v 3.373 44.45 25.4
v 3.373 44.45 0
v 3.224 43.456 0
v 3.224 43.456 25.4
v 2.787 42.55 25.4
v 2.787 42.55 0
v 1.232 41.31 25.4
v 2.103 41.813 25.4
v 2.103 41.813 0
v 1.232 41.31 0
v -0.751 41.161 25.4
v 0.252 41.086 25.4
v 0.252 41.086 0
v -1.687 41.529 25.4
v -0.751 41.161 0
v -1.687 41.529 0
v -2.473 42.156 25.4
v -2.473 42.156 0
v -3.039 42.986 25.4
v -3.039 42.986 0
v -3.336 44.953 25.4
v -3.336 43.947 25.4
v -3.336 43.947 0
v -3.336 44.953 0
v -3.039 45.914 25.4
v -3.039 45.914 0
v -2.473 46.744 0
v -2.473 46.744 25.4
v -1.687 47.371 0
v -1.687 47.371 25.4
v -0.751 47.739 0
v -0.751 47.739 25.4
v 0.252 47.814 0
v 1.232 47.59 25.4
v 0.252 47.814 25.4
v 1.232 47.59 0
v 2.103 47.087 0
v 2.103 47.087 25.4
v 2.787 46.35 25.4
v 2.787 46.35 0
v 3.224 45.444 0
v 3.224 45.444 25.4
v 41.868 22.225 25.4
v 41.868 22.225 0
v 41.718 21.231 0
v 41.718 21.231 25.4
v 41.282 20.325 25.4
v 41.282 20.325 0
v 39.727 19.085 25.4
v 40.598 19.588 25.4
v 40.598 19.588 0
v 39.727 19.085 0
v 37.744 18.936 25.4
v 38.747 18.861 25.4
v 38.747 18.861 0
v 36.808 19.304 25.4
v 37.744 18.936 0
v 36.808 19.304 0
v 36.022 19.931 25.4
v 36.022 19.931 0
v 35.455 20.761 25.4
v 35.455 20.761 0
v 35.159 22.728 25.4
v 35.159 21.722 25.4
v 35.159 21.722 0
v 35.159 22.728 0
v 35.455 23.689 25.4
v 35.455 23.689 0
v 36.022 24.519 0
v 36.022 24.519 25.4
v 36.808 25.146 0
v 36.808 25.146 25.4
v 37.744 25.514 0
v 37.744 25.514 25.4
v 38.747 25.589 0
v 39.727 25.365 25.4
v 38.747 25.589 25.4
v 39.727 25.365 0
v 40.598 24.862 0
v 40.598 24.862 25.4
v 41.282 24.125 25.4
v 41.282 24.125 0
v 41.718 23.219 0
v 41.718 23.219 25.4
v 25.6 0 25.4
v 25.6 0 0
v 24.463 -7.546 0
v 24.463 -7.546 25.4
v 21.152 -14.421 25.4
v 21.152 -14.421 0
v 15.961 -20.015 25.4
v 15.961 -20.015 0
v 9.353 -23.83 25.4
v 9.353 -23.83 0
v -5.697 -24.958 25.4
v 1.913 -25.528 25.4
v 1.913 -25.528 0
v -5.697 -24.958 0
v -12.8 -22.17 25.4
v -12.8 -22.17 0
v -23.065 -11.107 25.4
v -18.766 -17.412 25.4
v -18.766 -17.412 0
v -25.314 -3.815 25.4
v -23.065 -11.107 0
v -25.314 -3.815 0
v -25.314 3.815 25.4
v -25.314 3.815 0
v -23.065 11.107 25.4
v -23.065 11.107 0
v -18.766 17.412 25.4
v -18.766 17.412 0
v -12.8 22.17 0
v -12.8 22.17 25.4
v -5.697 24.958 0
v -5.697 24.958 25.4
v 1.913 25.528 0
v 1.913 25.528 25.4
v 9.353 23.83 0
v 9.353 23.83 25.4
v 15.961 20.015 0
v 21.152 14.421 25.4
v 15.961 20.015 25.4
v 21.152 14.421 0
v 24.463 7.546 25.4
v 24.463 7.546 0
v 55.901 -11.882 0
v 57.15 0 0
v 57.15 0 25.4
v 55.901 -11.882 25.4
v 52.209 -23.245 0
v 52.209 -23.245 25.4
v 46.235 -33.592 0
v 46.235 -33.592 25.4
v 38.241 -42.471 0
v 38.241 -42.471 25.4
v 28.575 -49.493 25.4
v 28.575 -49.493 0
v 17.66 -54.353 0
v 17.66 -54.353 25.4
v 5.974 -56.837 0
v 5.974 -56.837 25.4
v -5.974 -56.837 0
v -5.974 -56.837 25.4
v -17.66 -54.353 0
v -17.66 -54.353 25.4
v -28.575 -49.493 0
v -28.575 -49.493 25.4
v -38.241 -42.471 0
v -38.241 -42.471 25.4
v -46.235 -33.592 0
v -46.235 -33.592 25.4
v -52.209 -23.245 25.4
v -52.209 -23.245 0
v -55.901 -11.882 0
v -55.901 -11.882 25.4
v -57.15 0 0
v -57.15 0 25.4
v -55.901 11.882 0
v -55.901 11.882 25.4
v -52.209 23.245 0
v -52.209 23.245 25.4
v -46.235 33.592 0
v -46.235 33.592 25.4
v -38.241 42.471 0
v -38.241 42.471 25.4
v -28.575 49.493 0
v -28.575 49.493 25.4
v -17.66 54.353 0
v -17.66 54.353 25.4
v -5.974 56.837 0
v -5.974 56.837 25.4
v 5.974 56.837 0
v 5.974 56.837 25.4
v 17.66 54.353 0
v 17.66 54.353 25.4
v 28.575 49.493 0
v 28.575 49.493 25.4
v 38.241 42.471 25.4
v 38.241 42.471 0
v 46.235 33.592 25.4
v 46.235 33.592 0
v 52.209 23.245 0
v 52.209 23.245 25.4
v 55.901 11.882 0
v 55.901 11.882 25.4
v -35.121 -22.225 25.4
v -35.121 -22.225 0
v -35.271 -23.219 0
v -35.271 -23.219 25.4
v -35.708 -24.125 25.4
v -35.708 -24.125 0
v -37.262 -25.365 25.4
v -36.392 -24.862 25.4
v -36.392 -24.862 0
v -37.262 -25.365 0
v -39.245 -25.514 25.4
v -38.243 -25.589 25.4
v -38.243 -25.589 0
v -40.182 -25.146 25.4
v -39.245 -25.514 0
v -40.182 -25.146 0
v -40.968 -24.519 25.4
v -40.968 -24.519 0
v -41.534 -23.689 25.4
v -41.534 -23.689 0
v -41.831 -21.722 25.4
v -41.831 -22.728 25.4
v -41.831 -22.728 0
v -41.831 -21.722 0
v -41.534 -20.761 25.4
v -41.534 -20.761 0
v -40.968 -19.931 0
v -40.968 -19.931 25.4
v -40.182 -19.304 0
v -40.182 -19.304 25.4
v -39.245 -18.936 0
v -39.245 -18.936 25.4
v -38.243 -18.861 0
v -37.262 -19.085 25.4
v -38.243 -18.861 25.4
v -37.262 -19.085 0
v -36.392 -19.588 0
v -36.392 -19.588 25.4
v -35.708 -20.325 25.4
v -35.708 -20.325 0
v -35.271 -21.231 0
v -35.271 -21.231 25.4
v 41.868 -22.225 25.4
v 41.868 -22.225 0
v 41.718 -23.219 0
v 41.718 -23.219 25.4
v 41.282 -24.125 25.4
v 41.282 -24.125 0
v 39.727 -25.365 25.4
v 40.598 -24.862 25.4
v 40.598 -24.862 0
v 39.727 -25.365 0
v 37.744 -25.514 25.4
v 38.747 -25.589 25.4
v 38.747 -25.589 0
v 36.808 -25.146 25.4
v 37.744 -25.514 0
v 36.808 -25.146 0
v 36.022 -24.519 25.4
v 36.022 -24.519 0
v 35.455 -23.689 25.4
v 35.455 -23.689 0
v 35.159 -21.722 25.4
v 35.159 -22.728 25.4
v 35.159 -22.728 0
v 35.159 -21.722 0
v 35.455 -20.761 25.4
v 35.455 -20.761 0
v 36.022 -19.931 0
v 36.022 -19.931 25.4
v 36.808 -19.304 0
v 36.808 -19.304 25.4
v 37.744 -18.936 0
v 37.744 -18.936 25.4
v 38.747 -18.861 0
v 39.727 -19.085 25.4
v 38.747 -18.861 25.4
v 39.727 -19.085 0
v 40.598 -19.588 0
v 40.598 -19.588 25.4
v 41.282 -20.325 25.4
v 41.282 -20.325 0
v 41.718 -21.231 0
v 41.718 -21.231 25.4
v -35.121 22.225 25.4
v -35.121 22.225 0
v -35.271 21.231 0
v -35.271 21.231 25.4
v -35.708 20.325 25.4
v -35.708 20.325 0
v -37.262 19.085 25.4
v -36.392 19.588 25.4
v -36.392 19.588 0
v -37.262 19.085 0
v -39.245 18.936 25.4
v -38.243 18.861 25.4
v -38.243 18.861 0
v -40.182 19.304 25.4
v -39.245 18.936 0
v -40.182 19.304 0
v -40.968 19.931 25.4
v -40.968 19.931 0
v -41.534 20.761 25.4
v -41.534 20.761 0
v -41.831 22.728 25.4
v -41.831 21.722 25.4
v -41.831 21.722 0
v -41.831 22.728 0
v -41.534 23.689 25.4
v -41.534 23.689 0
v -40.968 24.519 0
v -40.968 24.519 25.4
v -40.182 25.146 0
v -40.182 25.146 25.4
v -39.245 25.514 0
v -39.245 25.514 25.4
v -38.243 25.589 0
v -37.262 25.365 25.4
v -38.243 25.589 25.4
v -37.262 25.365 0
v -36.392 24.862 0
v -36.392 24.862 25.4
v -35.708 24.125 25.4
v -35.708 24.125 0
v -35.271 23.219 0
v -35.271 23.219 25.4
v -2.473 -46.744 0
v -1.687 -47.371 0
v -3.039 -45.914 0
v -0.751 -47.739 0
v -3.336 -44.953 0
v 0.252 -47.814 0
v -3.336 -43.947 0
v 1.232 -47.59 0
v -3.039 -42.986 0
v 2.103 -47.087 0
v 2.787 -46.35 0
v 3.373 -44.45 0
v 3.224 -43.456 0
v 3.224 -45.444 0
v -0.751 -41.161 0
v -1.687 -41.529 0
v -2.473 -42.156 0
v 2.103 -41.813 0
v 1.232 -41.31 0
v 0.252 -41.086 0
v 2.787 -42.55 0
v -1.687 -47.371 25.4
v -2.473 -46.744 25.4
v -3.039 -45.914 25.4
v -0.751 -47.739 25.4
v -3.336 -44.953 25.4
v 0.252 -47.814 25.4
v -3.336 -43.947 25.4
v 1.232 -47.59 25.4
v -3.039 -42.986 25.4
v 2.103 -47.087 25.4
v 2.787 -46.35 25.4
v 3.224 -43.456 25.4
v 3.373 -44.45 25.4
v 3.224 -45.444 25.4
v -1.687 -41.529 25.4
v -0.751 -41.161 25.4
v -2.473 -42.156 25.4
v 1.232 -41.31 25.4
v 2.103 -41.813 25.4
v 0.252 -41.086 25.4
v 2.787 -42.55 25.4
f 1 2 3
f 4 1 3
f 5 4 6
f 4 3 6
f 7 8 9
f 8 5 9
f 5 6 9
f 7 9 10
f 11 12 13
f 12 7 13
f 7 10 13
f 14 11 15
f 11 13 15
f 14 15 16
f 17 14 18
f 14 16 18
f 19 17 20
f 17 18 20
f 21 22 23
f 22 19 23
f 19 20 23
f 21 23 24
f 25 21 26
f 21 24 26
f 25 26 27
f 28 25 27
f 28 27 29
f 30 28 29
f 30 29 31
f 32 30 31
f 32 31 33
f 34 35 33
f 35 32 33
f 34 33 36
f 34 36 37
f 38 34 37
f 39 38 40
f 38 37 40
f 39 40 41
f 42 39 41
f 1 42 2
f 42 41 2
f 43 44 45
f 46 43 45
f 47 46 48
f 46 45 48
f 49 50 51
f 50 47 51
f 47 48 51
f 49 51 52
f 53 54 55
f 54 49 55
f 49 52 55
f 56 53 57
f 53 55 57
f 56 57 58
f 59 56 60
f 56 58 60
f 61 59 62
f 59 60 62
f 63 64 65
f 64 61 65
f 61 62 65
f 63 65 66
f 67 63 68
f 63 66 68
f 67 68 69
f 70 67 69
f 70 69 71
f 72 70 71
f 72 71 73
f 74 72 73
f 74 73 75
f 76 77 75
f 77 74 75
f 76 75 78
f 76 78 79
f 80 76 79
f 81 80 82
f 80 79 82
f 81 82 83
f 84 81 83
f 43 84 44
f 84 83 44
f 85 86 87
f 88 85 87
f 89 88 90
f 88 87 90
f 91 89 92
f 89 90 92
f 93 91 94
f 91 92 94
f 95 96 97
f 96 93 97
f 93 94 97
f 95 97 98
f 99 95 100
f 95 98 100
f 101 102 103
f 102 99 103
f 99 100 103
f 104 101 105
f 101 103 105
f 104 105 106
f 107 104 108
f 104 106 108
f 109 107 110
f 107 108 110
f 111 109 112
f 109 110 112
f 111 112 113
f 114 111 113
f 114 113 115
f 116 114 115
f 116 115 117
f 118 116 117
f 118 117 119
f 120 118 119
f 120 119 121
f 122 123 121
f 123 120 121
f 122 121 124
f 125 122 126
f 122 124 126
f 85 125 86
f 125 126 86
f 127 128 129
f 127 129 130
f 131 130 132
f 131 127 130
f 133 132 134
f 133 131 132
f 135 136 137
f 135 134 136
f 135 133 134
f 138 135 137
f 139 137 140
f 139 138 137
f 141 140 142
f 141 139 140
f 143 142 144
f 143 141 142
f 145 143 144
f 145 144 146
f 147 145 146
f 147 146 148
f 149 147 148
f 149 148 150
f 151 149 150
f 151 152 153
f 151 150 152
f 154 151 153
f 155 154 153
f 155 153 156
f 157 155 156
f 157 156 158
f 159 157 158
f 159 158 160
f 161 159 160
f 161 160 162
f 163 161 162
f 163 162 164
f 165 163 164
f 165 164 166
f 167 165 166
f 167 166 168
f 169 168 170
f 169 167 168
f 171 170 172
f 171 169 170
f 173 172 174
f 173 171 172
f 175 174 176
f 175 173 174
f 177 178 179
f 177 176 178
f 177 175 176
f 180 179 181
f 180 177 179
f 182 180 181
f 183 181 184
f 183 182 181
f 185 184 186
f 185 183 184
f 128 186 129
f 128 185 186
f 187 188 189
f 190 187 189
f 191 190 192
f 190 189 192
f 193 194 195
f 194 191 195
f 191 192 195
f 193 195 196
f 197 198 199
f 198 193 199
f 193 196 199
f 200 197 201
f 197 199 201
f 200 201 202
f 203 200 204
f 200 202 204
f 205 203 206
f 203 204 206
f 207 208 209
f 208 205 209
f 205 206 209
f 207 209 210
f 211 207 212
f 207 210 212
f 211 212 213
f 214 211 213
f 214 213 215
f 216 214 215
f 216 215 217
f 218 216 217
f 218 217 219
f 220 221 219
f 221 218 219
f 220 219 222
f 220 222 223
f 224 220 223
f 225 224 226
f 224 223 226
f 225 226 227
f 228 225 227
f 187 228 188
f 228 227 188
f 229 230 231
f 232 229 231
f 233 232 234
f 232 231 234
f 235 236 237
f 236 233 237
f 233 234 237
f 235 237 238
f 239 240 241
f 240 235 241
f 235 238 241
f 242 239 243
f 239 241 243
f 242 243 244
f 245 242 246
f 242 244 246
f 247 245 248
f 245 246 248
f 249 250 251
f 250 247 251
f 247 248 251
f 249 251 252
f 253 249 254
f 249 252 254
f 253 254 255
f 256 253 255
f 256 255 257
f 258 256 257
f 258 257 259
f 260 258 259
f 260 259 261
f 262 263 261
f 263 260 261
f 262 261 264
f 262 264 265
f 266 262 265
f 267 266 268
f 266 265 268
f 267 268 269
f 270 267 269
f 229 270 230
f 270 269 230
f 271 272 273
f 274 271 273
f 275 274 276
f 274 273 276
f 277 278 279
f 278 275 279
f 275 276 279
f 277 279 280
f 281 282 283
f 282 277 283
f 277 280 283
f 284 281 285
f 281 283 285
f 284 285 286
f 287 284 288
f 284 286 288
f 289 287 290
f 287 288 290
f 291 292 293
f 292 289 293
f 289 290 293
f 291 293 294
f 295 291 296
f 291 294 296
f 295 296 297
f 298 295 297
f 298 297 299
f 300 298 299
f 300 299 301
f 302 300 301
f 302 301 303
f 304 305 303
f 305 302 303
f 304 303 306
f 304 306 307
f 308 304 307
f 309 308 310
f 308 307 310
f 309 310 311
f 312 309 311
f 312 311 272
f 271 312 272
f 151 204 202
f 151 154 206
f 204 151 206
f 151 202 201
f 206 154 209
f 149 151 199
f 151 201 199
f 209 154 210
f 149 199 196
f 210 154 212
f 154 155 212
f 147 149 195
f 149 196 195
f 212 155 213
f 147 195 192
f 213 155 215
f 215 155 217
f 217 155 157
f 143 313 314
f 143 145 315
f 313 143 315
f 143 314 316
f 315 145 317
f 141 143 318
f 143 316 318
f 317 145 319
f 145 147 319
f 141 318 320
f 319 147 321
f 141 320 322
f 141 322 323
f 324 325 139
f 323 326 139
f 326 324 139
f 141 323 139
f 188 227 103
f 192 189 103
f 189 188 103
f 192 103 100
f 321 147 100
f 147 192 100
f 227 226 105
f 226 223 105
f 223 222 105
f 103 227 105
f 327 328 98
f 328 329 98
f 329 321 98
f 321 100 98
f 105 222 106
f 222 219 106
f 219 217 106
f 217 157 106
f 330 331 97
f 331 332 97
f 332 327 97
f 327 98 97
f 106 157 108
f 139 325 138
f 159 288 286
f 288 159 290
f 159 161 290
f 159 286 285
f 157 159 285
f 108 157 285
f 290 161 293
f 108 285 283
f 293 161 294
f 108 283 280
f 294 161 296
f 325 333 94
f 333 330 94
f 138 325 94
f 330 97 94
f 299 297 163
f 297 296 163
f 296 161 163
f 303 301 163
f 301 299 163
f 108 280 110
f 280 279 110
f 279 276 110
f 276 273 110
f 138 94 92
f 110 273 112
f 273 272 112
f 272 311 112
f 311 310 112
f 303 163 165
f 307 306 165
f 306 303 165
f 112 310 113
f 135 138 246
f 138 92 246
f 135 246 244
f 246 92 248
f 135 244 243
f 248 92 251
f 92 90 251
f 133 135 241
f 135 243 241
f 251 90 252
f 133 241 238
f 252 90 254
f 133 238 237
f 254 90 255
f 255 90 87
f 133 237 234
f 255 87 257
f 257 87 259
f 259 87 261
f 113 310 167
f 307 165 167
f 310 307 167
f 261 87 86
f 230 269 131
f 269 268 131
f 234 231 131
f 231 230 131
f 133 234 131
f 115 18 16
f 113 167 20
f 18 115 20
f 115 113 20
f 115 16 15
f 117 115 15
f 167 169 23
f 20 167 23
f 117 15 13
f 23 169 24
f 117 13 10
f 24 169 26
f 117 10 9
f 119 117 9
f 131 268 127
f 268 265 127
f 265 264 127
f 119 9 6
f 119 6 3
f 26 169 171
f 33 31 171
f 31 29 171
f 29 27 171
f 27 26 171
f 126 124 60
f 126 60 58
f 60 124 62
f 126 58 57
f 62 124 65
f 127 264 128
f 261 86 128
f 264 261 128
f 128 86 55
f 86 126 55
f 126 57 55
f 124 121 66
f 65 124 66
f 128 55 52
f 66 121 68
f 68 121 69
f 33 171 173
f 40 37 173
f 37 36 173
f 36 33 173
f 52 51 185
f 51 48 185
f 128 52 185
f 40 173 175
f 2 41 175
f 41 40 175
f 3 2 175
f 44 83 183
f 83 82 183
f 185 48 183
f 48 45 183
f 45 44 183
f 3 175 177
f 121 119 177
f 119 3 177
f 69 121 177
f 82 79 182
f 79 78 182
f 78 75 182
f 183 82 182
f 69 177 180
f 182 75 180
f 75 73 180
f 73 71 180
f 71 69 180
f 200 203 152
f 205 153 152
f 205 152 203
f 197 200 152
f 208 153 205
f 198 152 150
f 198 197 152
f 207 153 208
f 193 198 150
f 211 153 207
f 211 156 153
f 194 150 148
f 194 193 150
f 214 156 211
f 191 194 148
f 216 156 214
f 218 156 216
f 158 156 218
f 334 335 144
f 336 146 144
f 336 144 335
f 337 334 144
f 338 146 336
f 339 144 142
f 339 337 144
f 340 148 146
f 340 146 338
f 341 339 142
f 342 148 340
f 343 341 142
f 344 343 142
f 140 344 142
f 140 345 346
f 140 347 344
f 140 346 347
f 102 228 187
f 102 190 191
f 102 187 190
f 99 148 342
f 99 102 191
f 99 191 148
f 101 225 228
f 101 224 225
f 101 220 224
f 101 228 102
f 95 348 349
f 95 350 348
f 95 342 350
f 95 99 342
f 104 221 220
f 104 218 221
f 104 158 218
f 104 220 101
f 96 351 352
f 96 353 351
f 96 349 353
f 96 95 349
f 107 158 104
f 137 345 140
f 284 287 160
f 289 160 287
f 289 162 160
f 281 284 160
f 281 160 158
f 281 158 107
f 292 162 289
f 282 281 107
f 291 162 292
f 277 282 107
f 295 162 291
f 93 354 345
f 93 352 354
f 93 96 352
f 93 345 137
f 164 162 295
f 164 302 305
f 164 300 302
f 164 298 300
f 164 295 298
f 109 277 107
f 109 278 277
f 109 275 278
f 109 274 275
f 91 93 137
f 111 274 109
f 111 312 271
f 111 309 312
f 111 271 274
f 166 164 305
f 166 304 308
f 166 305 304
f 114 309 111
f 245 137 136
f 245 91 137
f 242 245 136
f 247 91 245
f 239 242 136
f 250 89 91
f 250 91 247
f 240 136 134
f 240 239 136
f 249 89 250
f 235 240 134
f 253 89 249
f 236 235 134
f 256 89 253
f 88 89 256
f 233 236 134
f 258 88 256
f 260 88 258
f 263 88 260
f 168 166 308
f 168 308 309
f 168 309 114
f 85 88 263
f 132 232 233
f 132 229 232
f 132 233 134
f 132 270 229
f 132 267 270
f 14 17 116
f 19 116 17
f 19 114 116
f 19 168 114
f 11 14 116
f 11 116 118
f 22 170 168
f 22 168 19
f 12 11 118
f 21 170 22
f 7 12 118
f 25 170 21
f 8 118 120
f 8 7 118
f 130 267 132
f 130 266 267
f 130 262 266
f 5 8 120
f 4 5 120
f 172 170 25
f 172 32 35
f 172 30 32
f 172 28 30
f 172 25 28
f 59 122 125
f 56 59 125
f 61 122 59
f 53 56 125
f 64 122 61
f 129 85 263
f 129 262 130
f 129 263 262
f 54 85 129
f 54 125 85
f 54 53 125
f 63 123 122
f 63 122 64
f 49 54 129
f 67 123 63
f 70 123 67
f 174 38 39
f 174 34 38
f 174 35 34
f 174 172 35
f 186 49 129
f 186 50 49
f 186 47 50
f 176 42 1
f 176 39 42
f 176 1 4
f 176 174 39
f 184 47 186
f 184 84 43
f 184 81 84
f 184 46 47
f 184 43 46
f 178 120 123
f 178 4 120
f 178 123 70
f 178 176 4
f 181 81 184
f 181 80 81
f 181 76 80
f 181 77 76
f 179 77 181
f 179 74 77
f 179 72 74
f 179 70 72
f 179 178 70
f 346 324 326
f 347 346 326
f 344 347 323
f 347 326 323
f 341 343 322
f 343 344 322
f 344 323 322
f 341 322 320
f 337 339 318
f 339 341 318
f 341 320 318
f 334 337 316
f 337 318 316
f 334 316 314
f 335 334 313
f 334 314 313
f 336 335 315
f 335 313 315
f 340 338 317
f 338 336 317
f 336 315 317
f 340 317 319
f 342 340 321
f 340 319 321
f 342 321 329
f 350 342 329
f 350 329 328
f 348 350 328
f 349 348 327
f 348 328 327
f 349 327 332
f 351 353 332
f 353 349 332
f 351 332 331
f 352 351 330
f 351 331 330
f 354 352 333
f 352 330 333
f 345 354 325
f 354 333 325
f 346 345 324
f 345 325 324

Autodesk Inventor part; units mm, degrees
ref_plane "YZ Plane" through (0, 0, 0) normal (1, 0, 0) x (0, 1, 0)
ref_plane "XZ Plane" through (0, 0, 0) normal (0, 1, 0) x (-1, 0, 0)
ref_plane "XY Plane" through (0, 0, 0) normal (0, 0, 1) x (1, 0, 0)
sketch "Sketch1" plane through (0, 0, 0) normal (0, 0, 1) x (1, 0, 0)
  circle A0 centre (0, 0) radius 25.6
  circle A1 centre (0, 44.45) radius 3.3734
  circle A2 centre (-38.4948, 22.225) radius 3.3734
  circle A3 centre (-38.4948, -22.225) radius 3.3734
  circle A4 centre (0, -44.45) radius 3.3734
  circle A5 centre (38.4948, -22.225) radius 3.3734
  circle A6 centre (38.4948, 22.225) radius 3.3734
  circle A7 centre (0, 0) radius 57.15
  dimension "d0" = 51.2
  dimension "d1" = 44.45
  dimension "d2" = 6.7469
  dimension "d5" = 360
  dimension "d7" = 114.3
extrude "Extrusion1" add sketch "Sketch1" along normal blind 25.4
properties part number "IndexerWheelSpacer"
